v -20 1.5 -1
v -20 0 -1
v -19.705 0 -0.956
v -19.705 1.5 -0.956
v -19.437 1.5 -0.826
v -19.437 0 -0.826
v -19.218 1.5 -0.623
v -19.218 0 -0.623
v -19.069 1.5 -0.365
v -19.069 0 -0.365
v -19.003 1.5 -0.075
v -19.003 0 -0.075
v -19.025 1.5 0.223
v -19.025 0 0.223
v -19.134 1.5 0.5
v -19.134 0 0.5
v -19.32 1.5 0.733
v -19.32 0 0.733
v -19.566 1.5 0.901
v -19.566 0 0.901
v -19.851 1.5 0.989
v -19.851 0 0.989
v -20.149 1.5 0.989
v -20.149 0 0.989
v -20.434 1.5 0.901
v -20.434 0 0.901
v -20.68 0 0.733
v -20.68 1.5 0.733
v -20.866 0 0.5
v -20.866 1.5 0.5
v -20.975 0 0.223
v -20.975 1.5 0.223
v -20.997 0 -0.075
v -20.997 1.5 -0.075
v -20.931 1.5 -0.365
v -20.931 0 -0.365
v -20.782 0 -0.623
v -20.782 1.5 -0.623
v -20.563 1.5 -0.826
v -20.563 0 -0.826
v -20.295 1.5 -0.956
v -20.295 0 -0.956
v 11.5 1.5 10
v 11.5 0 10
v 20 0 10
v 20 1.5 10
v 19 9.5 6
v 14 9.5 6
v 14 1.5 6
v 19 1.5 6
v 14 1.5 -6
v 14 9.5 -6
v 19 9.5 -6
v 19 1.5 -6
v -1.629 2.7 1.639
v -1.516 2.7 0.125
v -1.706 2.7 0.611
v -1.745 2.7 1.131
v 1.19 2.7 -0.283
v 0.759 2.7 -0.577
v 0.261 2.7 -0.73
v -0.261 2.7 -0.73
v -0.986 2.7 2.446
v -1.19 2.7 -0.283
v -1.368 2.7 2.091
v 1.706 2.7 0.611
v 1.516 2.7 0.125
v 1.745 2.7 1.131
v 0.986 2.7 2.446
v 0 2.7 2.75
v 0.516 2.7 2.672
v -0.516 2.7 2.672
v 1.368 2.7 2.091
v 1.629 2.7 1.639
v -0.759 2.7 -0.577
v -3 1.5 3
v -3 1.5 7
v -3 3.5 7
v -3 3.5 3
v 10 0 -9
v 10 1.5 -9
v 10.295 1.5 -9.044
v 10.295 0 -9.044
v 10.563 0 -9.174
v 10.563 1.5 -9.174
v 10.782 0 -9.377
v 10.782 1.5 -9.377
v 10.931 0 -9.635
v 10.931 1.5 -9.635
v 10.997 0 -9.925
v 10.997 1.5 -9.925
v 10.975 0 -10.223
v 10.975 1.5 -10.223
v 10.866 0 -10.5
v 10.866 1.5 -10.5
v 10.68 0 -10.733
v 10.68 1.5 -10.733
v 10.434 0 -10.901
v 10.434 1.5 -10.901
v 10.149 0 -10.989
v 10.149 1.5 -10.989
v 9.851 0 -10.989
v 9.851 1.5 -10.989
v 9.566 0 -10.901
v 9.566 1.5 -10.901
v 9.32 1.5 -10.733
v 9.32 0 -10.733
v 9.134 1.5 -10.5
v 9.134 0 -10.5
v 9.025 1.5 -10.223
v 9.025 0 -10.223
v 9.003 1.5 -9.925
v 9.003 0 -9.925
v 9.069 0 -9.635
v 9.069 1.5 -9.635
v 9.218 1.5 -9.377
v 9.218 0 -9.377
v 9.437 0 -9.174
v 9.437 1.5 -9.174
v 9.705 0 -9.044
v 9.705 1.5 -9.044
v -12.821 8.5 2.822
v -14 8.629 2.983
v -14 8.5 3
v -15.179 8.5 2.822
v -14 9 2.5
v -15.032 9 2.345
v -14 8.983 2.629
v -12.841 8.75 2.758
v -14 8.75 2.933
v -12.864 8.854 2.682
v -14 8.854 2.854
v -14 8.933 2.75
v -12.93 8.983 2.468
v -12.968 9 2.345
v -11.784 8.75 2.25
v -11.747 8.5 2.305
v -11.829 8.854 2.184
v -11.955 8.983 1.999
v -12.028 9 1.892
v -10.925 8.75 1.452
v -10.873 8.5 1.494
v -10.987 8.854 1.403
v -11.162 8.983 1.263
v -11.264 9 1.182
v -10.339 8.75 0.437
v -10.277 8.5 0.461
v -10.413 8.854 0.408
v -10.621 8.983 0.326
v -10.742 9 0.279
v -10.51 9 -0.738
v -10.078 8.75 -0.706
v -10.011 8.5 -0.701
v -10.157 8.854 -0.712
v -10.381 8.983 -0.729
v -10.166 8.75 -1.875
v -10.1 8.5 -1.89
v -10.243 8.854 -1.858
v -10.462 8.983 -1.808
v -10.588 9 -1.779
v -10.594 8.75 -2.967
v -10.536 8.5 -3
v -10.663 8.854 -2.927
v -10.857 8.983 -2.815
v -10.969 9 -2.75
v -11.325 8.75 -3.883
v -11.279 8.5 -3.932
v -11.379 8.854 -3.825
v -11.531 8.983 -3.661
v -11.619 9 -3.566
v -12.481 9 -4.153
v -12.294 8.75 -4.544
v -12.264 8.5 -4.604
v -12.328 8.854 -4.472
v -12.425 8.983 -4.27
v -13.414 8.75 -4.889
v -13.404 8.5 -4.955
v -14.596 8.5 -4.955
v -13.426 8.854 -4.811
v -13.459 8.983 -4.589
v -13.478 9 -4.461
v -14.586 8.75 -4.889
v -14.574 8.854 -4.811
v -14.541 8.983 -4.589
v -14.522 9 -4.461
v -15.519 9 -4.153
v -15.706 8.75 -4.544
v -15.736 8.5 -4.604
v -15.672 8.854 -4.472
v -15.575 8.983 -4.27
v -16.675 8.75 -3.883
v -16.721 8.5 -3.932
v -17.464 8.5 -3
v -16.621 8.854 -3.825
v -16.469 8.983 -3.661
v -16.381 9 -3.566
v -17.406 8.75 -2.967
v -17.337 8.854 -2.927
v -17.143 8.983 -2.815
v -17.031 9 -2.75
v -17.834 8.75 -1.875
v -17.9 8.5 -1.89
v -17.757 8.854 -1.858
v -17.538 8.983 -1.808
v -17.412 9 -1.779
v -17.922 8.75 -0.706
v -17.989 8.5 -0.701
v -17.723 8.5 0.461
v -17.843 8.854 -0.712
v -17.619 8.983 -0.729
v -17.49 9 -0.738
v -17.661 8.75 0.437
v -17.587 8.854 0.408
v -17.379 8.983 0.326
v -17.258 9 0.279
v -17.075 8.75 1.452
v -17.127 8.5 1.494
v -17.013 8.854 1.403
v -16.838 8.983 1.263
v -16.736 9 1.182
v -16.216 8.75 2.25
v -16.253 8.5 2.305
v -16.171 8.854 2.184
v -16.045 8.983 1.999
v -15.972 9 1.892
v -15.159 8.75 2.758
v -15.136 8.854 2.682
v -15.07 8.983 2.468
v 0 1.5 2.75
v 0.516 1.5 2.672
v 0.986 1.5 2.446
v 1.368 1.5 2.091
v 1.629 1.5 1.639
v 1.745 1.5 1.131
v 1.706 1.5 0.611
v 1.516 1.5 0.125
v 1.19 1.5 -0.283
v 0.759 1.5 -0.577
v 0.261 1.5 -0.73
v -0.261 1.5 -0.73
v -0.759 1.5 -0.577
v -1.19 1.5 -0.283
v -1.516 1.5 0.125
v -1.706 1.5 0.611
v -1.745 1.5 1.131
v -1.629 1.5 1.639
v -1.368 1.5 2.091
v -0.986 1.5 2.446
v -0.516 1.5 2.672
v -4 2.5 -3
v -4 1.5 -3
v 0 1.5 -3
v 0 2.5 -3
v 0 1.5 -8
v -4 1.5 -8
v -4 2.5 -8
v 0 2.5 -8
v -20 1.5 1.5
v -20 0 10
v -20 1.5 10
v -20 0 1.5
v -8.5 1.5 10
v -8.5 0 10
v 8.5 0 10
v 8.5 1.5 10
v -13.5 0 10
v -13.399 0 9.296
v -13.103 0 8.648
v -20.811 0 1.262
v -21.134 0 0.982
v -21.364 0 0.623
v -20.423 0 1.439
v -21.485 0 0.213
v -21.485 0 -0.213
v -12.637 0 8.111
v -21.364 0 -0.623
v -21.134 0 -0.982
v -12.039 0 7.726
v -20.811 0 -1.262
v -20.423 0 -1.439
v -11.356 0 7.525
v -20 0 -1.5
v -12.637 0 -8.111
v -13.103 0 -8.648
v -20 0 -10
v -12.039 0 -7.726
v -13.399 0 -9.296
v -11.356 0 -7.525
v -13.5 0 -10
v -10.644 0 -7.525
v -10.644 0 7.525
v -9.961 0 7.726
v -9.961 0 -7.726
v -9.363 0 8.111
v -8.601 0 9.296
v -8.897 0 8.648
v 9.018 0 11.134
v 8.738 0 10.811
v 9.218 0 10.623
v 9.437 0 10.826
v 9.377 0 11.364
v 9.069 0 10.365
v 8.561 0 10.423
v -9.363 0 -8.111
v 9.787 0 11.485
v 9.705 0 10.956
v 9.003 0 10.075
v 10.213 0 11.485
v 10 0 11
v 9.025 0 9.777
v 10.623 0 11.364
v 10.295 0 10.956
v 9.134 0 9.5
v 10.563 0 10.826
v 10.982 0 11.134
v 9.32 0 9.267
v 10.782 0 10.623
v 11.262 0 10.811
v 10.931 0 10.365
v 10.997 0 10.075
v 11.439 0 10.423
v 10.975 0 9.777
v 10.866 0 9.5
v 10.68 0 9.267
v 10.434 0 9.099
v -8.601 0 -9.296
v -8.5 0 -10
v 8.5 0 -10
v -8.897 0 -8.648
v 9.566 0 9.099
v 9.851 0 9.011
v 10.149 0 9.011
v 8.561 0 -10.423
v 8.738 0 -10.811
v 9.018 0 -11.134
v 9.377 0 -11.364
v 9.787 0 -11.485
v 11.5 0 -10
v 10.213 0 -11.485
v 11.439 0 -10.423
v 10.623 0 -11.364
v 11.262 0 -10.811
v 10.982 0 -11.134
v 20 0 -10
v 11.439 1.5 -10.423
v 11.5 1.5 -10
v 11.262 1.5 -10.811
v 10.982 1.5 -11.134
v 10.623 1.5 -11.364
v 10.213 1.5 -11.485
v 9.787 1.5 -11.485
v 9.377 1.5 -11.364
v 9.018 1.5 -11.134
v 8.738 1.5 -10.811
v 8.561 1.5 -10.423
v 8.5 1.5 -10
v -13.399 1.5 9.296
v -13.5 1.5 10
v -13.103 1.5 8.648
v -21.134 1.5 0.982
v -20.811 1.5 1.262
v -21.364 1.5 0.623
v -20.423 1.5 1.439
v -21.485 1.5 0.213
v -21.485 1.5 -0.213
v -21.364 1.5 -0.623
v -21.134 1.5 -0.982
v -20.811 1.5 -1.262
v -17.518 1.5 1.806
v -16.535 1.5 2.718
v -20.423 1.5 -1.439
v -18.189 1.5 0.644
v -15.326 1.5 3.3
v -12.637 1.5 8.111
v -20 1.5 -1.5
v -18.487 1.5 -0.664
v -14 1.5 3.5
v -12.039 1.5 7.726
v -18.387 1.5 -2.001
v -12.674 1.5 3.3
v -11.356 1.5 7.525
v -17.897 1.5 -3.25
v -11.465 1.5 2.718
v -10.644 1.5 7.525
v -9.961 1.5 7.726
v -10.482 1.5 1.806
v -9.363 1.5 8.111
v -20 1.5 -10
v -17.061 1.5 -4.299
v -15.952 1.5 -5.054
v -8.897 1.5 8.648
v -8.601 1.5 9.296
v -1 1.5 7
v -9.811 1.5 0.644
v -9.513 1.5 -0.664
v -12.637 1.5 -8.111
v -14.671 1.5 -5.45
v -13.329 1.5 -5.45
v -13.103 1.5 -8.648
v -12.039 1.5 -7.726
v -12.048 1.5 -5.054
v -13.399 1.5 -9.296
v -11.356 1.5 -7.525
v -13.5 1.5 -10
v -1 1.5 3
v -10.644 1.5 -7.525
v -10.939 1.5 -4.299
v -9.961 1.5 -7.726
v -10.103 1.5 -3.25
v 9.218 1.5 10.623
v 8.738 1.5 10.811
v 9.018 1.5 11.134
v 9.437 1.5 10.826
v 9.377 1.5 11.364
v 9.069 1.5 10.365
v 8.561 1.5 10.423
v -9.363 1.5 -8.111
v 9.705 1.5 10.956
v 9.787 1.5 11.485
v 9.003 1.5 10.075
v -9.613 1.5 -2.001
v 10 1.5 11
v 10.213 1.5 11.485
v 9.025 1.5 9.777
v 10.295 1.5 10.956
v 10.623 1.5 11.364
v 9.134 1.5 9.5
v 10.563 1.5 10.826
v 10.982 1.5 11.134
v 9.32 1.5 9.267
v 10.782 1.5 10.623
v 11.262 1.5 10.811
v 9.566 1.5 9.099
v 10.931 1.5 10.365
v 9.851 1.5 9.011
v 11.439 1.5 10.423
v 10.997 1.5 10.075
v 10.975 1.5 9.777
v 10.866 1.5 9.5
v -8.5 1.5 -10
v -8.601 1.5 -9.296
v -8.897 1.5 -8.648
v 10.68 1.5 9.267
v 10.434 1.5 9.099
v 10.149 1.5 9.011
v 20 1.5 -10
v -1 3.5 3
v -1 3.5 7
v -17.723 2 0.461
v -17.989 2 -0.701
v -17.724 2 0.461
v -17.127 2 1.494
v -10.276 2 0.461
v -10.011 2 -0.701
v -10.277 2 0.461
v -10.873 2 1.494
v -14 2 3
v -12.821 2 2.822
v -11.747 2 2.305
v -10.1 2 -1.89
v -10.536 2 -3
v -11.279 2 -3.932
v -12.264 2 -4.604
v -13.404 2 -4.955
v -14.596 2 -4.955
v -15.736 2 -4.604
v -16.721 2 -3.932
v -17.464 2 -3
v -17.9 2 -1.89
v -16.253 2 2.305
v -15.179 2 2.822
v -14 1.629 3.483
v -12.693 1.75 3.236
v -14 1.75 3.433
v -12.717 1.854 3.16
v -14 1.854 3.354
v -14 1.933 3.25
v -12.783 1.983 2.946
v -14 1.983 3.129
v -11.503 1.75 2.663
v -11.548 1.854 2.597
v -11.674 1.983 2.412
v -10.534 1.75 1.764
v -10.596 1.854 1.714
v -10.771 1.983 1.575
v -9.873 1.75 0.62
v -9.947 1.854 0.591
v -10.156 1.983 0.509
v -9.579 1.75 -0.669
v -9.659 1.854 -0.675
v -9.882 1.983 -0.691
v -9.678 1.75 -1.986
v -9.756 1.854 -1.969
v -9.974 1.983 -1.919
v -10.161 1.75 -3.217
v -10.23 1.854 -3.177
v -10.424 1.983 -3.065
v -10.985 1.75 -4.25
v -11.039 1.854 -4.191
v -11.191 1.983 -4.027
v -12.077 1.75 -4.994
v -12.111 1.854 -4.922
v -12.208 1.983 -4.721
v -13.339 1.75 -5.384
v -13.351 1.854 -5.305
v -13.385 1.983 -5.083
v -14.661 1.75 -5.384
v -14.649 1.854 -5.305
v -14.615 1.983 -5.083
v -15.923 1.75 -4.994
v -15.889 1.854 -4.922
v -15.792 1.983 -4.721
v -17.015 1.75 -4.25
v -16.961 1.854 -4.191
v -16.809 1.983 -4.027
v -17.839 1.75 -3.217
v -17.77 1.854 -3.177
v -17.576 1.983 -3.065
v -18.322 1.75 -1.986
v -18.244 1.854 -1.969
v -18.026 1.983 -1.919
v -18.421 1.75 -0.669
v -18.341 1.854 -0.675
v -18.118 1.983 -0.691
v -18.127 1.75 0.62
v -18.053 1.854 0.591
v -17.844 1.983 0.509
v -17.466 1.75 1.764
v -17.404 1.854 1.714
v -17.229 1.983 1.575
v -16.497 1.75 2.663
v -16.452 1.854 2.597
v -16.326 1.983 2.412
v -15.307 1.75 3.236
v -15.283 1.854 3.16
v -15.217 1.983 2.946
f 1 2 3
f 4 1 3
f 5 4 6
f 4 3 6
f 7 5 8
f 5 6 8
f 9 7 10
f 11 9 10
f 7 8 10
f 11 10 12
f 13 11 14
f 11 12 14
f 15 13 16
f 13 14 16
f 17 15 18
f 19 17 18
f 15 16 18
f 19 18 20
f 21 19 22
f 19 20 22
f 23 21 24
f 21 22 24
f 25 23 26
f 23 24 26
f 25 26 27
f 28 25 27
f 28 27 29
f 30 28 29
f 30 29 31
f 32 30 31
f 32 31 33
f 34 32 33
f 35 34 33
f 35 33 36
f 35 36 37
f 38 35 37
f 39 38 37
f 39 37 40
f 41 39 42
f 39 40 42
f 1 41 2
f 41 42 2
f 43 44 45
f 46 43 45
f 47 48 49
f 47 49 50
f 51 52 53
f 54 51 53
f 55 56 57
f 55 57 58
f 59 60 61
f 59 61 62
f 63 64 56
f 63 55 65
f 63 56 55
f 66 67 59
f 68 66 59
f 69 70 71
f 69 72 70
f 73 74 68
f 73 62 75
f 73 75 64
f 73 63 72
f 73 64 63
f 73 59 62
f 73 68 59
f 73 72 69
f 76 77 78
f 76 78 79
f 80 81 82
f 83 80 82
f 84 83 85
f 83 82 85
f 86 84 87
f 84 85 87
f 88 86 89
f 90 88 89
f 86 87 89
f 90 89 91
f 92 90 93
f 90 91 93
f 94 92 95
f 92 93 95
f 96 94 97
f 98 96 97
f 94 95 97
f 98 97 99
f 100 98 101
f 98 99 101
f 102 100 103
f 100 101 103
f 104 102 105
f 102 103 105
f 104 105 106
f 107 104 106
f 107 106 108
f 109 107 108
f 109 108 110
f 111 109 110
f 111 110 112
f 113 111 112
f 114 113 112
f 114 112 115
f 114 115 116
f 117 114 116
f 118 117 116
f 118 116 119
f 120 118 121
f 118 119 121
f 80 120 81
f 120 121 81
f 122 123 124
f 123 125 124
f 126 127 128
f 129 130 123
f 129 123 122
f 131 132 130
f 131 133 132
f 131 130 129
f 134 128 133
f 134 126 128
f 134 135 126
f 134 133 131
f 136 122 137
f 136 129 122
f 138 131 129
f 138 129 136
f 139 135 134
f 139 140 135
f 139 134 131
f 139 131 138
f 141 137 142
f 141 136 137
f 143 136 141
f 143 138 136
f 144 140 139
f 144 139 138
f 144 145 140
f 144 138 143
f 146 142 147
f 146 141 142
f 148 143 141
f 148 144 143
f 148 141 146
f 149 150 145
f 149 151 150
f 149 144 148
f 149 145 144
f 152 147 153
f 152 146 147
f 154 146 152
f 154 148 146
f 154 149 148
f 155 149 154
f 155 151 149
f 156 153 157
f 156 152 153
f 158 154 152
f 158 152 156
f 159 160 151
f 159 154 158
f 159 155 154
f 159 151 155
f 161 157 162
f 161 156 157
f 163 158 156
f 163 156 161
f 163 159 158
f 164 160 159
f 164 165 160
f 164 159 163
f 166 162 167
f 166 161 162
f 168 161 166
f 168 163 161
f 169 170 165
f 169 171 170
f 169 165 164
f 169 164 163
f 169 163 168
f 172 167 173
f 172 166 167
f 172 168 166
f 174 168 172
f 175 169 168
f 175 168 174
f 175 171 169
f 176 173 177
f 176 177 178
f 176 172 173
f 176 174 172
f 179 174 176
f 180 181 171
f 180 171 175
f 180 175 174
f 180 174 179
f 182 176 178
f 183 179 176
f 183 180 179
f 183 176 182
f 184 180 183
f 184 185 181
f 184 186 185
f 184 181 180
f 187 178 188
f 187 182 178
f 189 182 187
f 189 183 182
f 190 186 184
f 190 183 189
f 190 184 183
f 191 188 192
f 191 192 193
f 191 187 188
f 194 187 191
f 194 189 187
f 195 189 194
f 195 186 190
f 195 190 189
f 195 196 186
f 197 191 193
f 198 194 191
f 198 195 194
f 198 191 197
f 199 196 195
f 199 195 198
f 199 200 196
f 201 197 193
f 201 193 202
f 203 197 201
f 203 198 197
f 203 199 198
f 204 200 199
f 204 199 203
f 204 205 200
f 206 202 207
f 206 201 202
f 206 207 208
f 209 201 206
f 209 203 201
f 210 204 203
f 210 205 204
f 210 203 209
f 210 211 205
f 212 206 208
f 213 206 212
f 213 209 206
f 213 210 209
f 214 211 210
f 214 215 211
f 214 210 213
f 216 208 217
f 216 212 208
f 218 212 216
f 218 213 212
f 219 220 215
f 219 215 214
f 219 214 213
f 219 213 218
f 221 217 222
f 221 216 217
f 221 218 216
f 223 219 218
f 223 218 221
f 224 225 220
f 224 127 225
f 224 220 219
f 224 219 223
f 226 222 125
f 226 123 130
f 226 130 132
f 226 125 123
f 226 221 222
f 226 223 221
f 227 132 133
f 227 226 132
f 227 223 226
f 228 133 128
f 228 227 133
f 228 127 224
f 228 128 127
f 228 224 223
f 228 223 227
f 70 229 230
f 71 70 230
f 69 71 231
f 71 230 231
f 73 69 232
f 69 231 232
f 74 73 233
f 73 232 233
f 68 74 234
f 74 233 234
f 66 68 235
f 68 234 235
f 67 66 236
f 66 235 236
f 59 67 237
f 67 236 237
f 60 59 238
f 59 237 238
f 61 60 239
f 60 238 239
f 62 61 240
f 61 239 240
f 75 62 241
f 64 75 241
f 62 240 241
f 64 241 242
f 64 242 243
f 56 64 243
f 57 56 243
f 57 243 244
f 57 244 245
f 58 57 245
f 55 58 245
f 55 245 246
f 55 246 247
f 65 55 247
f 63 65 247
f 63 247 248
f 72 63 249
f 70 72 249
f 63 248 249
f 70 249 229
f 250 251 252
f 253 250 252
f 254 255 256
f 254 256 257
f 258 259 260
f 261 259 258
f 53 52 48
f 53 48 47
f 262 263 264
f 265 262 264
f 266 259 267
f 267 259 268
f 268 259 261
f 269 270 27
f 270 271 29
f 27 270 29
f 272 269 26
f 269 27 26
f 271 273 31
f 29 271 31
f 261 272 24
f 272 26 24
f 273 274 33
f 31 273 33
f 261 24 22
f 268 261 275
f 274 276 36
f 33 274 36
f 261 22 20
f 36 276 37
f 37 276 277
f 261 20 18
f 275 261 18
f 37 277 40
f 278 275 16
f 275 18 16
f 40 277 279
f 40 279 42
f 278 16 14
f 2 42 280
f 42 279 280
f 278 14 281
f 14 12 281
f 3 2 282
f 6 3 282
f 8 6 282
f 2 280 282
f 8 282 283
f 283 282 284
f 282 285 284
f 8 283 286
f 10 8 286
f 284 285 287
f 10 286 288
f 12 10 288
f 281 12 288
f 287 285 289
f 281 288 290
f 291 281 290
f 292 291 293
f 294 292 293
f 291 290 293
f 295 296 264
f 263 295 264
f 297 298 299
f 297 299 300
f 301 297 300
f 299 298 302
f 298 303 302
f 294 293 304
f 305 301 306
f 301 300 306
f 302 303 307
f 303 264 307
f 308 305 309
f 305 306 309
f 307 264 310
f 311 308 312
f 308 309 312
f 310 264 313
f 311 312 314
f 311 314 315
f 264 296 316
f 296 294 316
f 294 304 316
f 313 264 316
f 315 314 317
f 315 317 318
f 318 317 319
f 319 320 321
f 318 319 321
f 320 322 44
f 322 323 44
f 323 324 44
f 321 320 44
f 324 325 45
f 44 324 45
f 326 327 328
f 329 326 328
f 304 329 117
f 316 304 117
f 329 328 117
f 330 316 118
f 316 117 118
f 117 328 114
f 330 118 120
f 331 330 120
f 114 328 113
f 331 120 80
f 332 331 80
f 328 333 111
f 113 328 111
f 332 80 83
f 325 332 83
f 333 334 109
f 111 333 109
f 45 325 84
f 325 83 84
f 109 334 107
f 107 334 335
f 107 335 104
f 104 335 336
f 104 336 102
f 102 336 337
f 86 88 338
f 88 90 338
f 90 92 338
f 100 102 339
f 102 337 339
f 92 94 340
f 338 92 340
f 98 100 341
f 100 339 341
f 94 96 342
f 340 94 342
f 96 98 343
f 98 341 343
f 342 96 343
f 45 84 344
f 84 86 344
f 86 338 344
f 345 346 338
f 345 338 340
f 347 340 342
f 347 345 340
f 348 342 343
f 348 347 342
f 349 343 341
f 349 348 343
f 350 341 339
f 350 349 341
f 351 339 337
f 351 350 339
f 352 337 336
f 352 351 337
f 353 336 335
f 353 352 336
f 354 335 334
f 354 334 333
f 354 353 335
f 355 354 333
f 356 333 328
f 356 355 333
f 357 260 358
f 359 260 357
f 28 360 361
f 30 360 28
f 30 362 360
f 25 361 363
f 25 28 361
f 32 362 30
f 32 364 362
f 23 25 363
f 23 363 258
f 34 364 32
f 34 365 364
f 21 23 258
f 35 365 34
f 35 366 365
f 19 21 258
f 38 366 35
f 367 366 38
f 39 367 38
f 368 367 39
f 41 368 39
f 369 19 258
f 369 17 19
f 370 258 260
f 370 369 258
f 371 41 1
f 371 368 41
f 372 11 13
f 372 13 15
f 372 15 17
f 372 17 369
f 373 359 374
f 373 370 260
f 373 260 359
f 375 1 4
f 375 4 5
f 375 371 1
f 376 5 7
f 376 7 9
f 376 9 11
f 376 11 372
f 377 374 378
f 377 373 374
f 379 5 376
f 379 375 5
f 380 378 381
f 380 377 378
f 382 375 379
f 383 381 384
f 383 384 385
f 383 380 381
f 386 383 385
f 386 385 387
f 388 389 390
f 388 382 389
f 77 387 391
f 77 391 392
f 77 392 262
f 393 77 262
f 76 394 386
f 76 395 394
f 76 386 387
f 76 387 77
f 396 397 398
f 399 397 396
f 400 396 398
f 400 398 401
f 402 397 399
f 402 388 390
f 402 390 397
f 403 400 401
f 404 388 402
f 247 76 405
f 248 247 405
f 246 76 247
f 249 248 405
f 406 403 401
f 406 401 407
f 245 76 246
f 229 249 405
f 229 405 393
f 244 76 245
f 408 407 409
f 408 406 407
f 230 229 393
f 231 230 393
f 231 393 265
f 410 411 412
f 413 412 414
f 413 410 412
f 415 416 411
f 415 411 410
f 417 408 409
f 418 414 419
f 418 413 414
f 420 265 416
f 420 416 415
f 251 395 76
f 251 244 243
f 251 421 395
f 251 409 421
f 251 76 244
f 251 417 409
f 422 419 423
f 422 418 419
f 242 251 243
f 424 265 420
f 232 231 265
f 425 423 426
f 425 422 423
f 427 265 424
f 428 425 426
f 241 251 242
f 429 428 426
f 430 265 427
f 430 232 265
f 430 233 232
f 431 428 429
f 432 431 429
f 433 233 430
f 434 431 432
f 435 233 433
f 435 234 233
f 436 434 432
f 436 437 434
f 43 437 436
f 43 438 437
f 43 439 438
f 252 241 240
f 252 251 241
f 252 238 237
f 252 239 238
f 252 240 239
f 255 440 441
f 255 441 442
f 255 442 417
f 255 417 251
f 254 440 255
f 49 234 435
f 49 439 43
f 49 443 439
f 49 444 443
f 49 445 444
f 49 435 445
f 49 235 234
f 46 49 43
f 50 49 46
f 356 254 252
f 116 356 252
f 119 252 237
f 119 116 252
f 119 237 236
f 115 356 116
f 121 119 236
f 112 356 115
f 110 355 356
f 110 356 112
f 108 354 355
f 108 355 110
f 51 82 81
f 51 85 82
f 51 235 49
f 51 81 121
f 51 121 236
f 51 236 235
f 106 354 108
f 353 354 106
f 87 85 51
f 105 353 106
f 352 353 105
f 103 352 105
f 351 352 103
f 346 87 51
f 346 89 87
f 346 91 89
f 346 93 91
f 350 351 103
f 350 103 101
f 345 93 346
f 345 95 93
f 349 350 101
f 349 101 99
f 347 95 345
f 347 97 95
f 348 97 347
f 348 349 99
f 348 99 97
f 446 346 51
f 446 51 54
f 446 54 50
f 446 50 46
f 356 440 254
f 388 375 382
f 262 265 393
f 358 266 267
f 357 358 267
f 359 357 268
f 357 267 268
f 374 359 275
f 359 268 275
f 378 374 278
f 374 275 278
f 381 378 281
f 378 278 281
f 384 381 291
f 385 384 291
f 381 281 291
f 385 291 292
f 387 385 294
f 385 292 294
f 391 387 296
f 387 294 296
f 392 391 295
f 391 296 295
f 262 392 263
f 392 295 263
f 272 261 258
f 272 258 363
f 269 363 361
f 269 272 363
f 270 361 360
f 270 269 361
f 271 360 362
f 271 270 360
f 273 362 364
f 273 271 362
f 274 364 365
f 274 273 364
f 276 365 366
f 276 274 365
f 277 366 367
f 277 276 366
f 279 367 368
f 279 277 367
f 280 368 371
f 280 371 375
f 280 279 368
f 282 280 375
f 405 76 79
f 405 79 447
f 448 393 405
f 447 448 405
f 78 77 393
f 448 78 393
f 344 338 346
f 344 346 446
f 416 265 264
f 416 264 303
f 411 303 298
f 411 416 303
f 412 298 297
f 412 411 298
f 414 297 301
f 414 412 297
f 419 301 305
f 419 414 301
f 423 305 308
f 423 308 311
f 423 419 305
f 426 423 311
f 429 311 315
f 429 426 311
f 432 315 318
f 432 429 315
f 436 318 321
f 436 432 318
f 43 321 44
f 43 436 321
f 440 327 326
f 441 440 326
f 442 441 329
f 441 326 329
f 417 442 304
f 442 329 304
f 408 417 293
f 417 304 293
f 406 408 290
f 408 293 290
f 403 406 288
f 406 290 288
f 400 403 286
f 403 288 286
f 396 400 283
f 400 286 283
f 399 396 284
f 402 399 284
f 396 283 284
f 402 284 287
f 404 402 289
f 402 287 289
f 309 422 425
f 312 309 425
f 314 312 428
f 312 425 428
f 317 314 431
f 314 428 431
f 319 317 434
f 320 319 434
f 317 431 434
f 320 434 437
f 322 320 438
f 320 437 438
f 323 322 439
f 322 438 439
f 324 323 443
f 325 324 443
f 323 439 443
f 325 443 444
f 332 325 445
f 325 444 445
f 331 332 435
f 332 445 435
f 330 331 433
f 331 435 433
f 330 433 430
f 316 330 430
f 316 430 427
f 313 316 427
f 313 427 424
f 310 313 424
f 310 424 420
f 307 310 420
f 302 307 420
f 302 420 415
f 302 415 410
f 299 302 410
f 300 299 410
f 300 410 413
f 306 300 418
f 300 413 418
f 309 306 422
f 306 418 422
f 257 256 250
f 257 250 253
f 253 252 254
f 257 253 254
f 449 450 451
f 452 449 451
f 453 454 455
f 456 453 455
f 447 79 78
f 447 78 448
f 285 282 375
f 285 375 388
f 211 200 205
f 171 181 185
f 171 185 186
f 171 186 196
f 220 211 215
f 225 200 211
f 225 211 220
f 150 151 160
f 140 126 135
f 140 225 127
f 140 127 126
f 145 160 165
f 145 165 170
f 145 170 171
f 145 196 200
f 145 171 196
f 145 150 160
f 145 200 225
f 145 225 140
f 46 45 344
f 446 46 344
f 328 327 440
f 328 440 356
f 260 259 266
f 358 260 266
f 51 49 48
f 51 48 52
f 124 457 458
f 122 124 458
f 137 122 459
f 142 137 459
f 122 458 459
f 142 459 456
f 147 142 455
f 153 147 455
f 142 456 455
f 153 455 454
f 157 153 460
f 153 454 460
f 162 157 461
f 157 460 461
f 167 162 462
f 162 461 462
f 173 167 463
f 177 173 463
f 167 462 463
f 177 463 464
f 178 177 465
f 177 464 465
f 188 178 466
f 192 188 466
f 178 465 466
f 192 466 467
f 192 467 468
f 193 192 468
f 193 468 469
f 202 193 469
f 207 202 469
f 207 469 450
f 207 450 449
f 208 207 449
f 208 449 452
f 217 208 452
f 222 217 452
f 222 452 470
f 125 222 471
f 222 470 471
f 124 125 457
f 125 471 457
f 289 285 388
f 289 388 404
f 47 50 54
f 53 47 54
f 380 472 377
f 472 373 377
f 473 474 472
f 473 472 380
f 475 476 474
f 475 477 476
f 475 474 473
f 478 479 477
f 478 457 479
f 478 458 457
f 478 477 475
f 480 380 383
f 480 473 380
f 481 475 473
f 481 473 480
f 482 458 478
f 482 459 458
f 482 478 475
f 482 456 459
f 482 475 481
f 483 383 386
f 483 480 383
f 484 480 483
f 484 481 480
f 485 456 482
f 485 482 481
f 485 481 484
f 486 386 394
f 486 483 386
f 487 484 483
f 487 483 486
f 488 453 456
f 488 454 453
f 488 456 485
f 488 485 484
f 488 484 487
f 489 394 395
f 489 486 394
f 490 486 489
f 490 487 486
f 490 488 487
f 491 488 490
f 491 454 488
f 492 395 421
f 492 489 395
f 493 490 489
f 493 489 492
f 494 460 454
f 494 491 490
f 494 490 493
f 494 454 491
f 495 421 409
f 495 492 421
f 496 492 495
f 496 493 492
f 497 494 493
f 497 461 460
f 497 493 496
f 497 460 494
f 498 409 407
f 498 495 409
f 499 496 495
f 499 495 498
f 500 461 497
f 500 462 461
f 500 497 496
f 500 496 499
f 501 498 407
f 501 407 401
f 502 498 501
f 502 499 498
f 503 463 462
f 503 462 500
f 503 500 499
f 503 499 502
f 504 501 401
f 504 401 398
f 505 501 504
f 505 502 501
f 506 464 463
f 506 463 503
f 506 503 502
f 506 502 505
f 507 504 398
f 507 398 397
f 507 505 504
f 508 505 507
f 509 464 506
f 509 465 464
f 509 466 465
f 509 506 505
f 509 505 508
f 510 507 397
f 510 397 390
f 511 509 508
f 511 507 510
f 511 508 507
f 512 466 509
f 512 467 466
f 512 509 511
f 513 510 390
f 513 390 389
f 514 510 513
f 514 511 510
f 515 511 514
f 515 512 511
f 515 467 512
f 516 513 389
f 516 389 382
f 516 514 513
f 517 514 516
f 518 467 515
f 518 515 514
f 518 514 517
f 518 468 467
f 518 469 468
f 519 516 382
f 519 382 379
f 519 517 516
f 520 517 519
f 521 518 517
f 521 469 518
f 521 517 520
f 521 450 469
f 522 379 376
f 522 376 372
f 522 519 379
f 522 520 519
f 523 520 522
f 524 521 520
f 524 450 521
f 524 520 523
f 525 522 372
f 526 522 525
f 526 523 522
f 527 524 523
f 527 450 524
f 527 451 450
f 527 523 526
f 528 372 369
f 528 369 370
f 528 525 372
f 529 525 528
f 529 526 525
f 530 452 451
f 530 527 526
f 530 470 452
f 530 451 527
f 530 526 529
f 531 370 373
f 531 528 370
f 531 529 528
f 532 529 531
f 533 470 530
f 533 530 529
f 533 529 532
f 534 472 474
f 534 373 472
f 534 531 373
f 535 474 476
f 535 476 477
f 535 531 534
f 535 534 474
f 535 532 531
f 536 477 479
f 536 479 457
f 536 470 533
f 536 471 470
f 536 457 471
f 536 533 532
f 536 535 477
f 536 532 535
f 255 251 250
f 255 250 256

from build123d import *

# Parameters (mm, degrees)
SKETCH1_W                        = 40
SKETCH1_H                        = 20
PCB_DEPTH                        = 1.5
SKETCH3_R                        = 1.5
TOP_MOUNTING_HOLE_DEPTH          = 1.5
SKETCH4_R                        = 1
TOP_MOUNTING_HOLE_2_DEPTH        = 1.5
SKETCH5_R                        = 2.5
SIDE_INLETS_DEPTH                = 1.5
SKETCH6_R                        = 1.5
SIDE_MOUNTING_HOLE_OUTLINE_DEPTH = 1.5
SKETCH7_R                        = 1
SIDE_MOUNTING_HOLES_DEPTH        = 1.5
SKETCH8_R                        = 4.5
SENSOR_BASE_DEPTH                = 0.5
SKETCH9_R                        = 4
SENSOR_DEPTH                     = 7
SENSOR_FILLET_R                  = 0.5
SKETCH10_W                       = 5
SKETCH10_H                       = 12
CONNECTOR_DEPTH                  = 8
SKETCH11_W                       = 4
SKETCH11_H                       = 5
CHIP_DEPTH                       = 1
SKETCH12_R                       = 1.75
BOSS_EXTRUDE10_DEPTH             = 1.2
SKETCH13_W                       = 2
SKETCH13_H                       = 4
BOSS_EXTRUDE11_DEPTH             = 2


with BuildPart() as part:
    # Sketch1 → PCB (new body)
    with BuildSketch(Plane(origin=(0, 0, 0), x_dir=(1, 0, 0), z_dir=(0, 1, 0))):
        Rectangle(SKETCH1_W, SKETCH1_H)
    extrude(amount=PCB_DEPTH)

    # Sketch3 → Top mounting hole (add)
    with BuildSketch(Plane.XZ):
        with Locations((-20, 0)):
            Circle(SKETCH3_R)
    extrude(amount=-TOP_MOUNTING_HOLE_DEPTH)

    # Sketch4 → Top mounting hole 2 (cut)
    with BuildSketch(Plane.XZ):
        with Locations(Location((-20, 0, 0), (0, 0, 270))):
            Circle(SKETCH4_R)
    extrude(amount=-TOP_MOUNTING_HOLE_2_DEPTH, mode=Mode.SUBTRACT)

    # Sketch5 → Side inlets (cut)
    with BuildSketch(Plane.XZ):
        with Locations((-11, -10)):
            Circle(SKETCH5_R)
        with Locations((-11, 10)):
            Circle(SKETCH5_R)
    extrude(amount=-SIDE_INLETS_DEPTH, mode=Mode.SUBTRACT)

    # Sketch6 → side mounting hole outline (add)
    with BuildSketch(Plane(origin=(0, 1.5, 0), x_dir=(1, 0, 0), z_dir=(0, 1, 0))):
        with Locations((10, 10)):
            Circle(SKETCH6_R)
        with Locations((10, -10)):
            Circle(SKETCH6_R)
    extrude(amount=-SIDE_MOUNTING_HOLE_OUTLINE_DEPTH)

    # Sketch7 → side mounting holes (cut)
    with BuildSketch(Plane(origin=(0, 1.5, 0), x_dir=(1, 0, 0), z_dir=(0, 1, 0))):
        with Locations(Location((10, 10, 0), (0, 0, 270))):
            Circle(SKETCH7_R)
        with Locations(Location((10, -10, 0), (0, 0, 270))):
            Circle(SKETCH7_R)
    extrude(amount=-SIDE_MOUNTING_HOLES_DEPTH, mode=Mode.SUBTRACT)

    # Sketch8 → sensor base (add)
    with BuildSketch(Plane(origin=(0, 1.5, 0), x_dir=(1, 0, 0), z_dir=(0, 1, 0))):
        with Locations(Location((-14, 1, 0), (0, 0, 270))):
            Circle(SKETCH8_R)
    extrude(amount=SENSOR_BASE_DEPTH)

    # Sketch9 → sensor (add)
    with BuildSketch(Plane(origin=(0, 2, 0), x_dir=(1, 0, 0), z_dir=(0, 1, 0))):
        with Locations(Location((-14, 1, 0), (0, 0, 270))):
            Circle(SKETCH9_R)
    extrude(amount=SENSOR_DEPTH)

    # sensor fillet
    sensor_fillet_edges = [part.edges().sort_by_distance(p)[0] for p in [
        (-14, 2, -5.5),
        (-14, 9, -5),
    ]]
    fillet(sensor_fillet_edges, radius=SENSOR_FILLET_R - 0.0001)  # a hair under: the kernel refuses the full size

    # Sketch10 → connector (add)
    with BuildSketch(Plane(origin=(0, 1.5, 0), x_dir=(1, 0, 0), z_dir=(0, 1, 0))):
        with Locations((16.5, 0)):
            Rectangle(SKETCH10_W, SKETCH10_H)
    extrude(amount=CONNECTOR_DEPTH)

    # Sketch11 → chip (add)
    with BuildSketch(Plane(origin=(0, 1.5, 0), x_dir=(1, 0, 0), z_dir=(0, 1, 0))):
        with Locations((-2, 5.5)):
            Rectangle(SKETCH11_W, SKETCH11_H)
    extrude(amount=CHIP_DEPTH)

    # Sketch12 → Boss-Extrude10 (add)
    with BuildSketch(Plane(origin=(0, 1.5, 0), x_dir=(1, 0, 0), z_dir=(0, 1, 0))):
        with Locations(Location((0, -1, 0), (0, 0, 270))):
            Circle(SKETCH12_R)
    extrude(amount=BOSS_EXTRUDE10_DEPTH)

    # Sketch13 → Boss-Extrude11 (add)
    with BuildSketch(Plane(origin=(0, 1.5, 0), x_dir=(1, 0, 0), z_dir=(0, 1, 0))):
        with Locations((-2, -5)):
            Rectangle(SKETCH13_W, SKETCH13_H)
    extrude(amount=BOSS_EXTRUDE11_DEPTH)


solid = part.part
